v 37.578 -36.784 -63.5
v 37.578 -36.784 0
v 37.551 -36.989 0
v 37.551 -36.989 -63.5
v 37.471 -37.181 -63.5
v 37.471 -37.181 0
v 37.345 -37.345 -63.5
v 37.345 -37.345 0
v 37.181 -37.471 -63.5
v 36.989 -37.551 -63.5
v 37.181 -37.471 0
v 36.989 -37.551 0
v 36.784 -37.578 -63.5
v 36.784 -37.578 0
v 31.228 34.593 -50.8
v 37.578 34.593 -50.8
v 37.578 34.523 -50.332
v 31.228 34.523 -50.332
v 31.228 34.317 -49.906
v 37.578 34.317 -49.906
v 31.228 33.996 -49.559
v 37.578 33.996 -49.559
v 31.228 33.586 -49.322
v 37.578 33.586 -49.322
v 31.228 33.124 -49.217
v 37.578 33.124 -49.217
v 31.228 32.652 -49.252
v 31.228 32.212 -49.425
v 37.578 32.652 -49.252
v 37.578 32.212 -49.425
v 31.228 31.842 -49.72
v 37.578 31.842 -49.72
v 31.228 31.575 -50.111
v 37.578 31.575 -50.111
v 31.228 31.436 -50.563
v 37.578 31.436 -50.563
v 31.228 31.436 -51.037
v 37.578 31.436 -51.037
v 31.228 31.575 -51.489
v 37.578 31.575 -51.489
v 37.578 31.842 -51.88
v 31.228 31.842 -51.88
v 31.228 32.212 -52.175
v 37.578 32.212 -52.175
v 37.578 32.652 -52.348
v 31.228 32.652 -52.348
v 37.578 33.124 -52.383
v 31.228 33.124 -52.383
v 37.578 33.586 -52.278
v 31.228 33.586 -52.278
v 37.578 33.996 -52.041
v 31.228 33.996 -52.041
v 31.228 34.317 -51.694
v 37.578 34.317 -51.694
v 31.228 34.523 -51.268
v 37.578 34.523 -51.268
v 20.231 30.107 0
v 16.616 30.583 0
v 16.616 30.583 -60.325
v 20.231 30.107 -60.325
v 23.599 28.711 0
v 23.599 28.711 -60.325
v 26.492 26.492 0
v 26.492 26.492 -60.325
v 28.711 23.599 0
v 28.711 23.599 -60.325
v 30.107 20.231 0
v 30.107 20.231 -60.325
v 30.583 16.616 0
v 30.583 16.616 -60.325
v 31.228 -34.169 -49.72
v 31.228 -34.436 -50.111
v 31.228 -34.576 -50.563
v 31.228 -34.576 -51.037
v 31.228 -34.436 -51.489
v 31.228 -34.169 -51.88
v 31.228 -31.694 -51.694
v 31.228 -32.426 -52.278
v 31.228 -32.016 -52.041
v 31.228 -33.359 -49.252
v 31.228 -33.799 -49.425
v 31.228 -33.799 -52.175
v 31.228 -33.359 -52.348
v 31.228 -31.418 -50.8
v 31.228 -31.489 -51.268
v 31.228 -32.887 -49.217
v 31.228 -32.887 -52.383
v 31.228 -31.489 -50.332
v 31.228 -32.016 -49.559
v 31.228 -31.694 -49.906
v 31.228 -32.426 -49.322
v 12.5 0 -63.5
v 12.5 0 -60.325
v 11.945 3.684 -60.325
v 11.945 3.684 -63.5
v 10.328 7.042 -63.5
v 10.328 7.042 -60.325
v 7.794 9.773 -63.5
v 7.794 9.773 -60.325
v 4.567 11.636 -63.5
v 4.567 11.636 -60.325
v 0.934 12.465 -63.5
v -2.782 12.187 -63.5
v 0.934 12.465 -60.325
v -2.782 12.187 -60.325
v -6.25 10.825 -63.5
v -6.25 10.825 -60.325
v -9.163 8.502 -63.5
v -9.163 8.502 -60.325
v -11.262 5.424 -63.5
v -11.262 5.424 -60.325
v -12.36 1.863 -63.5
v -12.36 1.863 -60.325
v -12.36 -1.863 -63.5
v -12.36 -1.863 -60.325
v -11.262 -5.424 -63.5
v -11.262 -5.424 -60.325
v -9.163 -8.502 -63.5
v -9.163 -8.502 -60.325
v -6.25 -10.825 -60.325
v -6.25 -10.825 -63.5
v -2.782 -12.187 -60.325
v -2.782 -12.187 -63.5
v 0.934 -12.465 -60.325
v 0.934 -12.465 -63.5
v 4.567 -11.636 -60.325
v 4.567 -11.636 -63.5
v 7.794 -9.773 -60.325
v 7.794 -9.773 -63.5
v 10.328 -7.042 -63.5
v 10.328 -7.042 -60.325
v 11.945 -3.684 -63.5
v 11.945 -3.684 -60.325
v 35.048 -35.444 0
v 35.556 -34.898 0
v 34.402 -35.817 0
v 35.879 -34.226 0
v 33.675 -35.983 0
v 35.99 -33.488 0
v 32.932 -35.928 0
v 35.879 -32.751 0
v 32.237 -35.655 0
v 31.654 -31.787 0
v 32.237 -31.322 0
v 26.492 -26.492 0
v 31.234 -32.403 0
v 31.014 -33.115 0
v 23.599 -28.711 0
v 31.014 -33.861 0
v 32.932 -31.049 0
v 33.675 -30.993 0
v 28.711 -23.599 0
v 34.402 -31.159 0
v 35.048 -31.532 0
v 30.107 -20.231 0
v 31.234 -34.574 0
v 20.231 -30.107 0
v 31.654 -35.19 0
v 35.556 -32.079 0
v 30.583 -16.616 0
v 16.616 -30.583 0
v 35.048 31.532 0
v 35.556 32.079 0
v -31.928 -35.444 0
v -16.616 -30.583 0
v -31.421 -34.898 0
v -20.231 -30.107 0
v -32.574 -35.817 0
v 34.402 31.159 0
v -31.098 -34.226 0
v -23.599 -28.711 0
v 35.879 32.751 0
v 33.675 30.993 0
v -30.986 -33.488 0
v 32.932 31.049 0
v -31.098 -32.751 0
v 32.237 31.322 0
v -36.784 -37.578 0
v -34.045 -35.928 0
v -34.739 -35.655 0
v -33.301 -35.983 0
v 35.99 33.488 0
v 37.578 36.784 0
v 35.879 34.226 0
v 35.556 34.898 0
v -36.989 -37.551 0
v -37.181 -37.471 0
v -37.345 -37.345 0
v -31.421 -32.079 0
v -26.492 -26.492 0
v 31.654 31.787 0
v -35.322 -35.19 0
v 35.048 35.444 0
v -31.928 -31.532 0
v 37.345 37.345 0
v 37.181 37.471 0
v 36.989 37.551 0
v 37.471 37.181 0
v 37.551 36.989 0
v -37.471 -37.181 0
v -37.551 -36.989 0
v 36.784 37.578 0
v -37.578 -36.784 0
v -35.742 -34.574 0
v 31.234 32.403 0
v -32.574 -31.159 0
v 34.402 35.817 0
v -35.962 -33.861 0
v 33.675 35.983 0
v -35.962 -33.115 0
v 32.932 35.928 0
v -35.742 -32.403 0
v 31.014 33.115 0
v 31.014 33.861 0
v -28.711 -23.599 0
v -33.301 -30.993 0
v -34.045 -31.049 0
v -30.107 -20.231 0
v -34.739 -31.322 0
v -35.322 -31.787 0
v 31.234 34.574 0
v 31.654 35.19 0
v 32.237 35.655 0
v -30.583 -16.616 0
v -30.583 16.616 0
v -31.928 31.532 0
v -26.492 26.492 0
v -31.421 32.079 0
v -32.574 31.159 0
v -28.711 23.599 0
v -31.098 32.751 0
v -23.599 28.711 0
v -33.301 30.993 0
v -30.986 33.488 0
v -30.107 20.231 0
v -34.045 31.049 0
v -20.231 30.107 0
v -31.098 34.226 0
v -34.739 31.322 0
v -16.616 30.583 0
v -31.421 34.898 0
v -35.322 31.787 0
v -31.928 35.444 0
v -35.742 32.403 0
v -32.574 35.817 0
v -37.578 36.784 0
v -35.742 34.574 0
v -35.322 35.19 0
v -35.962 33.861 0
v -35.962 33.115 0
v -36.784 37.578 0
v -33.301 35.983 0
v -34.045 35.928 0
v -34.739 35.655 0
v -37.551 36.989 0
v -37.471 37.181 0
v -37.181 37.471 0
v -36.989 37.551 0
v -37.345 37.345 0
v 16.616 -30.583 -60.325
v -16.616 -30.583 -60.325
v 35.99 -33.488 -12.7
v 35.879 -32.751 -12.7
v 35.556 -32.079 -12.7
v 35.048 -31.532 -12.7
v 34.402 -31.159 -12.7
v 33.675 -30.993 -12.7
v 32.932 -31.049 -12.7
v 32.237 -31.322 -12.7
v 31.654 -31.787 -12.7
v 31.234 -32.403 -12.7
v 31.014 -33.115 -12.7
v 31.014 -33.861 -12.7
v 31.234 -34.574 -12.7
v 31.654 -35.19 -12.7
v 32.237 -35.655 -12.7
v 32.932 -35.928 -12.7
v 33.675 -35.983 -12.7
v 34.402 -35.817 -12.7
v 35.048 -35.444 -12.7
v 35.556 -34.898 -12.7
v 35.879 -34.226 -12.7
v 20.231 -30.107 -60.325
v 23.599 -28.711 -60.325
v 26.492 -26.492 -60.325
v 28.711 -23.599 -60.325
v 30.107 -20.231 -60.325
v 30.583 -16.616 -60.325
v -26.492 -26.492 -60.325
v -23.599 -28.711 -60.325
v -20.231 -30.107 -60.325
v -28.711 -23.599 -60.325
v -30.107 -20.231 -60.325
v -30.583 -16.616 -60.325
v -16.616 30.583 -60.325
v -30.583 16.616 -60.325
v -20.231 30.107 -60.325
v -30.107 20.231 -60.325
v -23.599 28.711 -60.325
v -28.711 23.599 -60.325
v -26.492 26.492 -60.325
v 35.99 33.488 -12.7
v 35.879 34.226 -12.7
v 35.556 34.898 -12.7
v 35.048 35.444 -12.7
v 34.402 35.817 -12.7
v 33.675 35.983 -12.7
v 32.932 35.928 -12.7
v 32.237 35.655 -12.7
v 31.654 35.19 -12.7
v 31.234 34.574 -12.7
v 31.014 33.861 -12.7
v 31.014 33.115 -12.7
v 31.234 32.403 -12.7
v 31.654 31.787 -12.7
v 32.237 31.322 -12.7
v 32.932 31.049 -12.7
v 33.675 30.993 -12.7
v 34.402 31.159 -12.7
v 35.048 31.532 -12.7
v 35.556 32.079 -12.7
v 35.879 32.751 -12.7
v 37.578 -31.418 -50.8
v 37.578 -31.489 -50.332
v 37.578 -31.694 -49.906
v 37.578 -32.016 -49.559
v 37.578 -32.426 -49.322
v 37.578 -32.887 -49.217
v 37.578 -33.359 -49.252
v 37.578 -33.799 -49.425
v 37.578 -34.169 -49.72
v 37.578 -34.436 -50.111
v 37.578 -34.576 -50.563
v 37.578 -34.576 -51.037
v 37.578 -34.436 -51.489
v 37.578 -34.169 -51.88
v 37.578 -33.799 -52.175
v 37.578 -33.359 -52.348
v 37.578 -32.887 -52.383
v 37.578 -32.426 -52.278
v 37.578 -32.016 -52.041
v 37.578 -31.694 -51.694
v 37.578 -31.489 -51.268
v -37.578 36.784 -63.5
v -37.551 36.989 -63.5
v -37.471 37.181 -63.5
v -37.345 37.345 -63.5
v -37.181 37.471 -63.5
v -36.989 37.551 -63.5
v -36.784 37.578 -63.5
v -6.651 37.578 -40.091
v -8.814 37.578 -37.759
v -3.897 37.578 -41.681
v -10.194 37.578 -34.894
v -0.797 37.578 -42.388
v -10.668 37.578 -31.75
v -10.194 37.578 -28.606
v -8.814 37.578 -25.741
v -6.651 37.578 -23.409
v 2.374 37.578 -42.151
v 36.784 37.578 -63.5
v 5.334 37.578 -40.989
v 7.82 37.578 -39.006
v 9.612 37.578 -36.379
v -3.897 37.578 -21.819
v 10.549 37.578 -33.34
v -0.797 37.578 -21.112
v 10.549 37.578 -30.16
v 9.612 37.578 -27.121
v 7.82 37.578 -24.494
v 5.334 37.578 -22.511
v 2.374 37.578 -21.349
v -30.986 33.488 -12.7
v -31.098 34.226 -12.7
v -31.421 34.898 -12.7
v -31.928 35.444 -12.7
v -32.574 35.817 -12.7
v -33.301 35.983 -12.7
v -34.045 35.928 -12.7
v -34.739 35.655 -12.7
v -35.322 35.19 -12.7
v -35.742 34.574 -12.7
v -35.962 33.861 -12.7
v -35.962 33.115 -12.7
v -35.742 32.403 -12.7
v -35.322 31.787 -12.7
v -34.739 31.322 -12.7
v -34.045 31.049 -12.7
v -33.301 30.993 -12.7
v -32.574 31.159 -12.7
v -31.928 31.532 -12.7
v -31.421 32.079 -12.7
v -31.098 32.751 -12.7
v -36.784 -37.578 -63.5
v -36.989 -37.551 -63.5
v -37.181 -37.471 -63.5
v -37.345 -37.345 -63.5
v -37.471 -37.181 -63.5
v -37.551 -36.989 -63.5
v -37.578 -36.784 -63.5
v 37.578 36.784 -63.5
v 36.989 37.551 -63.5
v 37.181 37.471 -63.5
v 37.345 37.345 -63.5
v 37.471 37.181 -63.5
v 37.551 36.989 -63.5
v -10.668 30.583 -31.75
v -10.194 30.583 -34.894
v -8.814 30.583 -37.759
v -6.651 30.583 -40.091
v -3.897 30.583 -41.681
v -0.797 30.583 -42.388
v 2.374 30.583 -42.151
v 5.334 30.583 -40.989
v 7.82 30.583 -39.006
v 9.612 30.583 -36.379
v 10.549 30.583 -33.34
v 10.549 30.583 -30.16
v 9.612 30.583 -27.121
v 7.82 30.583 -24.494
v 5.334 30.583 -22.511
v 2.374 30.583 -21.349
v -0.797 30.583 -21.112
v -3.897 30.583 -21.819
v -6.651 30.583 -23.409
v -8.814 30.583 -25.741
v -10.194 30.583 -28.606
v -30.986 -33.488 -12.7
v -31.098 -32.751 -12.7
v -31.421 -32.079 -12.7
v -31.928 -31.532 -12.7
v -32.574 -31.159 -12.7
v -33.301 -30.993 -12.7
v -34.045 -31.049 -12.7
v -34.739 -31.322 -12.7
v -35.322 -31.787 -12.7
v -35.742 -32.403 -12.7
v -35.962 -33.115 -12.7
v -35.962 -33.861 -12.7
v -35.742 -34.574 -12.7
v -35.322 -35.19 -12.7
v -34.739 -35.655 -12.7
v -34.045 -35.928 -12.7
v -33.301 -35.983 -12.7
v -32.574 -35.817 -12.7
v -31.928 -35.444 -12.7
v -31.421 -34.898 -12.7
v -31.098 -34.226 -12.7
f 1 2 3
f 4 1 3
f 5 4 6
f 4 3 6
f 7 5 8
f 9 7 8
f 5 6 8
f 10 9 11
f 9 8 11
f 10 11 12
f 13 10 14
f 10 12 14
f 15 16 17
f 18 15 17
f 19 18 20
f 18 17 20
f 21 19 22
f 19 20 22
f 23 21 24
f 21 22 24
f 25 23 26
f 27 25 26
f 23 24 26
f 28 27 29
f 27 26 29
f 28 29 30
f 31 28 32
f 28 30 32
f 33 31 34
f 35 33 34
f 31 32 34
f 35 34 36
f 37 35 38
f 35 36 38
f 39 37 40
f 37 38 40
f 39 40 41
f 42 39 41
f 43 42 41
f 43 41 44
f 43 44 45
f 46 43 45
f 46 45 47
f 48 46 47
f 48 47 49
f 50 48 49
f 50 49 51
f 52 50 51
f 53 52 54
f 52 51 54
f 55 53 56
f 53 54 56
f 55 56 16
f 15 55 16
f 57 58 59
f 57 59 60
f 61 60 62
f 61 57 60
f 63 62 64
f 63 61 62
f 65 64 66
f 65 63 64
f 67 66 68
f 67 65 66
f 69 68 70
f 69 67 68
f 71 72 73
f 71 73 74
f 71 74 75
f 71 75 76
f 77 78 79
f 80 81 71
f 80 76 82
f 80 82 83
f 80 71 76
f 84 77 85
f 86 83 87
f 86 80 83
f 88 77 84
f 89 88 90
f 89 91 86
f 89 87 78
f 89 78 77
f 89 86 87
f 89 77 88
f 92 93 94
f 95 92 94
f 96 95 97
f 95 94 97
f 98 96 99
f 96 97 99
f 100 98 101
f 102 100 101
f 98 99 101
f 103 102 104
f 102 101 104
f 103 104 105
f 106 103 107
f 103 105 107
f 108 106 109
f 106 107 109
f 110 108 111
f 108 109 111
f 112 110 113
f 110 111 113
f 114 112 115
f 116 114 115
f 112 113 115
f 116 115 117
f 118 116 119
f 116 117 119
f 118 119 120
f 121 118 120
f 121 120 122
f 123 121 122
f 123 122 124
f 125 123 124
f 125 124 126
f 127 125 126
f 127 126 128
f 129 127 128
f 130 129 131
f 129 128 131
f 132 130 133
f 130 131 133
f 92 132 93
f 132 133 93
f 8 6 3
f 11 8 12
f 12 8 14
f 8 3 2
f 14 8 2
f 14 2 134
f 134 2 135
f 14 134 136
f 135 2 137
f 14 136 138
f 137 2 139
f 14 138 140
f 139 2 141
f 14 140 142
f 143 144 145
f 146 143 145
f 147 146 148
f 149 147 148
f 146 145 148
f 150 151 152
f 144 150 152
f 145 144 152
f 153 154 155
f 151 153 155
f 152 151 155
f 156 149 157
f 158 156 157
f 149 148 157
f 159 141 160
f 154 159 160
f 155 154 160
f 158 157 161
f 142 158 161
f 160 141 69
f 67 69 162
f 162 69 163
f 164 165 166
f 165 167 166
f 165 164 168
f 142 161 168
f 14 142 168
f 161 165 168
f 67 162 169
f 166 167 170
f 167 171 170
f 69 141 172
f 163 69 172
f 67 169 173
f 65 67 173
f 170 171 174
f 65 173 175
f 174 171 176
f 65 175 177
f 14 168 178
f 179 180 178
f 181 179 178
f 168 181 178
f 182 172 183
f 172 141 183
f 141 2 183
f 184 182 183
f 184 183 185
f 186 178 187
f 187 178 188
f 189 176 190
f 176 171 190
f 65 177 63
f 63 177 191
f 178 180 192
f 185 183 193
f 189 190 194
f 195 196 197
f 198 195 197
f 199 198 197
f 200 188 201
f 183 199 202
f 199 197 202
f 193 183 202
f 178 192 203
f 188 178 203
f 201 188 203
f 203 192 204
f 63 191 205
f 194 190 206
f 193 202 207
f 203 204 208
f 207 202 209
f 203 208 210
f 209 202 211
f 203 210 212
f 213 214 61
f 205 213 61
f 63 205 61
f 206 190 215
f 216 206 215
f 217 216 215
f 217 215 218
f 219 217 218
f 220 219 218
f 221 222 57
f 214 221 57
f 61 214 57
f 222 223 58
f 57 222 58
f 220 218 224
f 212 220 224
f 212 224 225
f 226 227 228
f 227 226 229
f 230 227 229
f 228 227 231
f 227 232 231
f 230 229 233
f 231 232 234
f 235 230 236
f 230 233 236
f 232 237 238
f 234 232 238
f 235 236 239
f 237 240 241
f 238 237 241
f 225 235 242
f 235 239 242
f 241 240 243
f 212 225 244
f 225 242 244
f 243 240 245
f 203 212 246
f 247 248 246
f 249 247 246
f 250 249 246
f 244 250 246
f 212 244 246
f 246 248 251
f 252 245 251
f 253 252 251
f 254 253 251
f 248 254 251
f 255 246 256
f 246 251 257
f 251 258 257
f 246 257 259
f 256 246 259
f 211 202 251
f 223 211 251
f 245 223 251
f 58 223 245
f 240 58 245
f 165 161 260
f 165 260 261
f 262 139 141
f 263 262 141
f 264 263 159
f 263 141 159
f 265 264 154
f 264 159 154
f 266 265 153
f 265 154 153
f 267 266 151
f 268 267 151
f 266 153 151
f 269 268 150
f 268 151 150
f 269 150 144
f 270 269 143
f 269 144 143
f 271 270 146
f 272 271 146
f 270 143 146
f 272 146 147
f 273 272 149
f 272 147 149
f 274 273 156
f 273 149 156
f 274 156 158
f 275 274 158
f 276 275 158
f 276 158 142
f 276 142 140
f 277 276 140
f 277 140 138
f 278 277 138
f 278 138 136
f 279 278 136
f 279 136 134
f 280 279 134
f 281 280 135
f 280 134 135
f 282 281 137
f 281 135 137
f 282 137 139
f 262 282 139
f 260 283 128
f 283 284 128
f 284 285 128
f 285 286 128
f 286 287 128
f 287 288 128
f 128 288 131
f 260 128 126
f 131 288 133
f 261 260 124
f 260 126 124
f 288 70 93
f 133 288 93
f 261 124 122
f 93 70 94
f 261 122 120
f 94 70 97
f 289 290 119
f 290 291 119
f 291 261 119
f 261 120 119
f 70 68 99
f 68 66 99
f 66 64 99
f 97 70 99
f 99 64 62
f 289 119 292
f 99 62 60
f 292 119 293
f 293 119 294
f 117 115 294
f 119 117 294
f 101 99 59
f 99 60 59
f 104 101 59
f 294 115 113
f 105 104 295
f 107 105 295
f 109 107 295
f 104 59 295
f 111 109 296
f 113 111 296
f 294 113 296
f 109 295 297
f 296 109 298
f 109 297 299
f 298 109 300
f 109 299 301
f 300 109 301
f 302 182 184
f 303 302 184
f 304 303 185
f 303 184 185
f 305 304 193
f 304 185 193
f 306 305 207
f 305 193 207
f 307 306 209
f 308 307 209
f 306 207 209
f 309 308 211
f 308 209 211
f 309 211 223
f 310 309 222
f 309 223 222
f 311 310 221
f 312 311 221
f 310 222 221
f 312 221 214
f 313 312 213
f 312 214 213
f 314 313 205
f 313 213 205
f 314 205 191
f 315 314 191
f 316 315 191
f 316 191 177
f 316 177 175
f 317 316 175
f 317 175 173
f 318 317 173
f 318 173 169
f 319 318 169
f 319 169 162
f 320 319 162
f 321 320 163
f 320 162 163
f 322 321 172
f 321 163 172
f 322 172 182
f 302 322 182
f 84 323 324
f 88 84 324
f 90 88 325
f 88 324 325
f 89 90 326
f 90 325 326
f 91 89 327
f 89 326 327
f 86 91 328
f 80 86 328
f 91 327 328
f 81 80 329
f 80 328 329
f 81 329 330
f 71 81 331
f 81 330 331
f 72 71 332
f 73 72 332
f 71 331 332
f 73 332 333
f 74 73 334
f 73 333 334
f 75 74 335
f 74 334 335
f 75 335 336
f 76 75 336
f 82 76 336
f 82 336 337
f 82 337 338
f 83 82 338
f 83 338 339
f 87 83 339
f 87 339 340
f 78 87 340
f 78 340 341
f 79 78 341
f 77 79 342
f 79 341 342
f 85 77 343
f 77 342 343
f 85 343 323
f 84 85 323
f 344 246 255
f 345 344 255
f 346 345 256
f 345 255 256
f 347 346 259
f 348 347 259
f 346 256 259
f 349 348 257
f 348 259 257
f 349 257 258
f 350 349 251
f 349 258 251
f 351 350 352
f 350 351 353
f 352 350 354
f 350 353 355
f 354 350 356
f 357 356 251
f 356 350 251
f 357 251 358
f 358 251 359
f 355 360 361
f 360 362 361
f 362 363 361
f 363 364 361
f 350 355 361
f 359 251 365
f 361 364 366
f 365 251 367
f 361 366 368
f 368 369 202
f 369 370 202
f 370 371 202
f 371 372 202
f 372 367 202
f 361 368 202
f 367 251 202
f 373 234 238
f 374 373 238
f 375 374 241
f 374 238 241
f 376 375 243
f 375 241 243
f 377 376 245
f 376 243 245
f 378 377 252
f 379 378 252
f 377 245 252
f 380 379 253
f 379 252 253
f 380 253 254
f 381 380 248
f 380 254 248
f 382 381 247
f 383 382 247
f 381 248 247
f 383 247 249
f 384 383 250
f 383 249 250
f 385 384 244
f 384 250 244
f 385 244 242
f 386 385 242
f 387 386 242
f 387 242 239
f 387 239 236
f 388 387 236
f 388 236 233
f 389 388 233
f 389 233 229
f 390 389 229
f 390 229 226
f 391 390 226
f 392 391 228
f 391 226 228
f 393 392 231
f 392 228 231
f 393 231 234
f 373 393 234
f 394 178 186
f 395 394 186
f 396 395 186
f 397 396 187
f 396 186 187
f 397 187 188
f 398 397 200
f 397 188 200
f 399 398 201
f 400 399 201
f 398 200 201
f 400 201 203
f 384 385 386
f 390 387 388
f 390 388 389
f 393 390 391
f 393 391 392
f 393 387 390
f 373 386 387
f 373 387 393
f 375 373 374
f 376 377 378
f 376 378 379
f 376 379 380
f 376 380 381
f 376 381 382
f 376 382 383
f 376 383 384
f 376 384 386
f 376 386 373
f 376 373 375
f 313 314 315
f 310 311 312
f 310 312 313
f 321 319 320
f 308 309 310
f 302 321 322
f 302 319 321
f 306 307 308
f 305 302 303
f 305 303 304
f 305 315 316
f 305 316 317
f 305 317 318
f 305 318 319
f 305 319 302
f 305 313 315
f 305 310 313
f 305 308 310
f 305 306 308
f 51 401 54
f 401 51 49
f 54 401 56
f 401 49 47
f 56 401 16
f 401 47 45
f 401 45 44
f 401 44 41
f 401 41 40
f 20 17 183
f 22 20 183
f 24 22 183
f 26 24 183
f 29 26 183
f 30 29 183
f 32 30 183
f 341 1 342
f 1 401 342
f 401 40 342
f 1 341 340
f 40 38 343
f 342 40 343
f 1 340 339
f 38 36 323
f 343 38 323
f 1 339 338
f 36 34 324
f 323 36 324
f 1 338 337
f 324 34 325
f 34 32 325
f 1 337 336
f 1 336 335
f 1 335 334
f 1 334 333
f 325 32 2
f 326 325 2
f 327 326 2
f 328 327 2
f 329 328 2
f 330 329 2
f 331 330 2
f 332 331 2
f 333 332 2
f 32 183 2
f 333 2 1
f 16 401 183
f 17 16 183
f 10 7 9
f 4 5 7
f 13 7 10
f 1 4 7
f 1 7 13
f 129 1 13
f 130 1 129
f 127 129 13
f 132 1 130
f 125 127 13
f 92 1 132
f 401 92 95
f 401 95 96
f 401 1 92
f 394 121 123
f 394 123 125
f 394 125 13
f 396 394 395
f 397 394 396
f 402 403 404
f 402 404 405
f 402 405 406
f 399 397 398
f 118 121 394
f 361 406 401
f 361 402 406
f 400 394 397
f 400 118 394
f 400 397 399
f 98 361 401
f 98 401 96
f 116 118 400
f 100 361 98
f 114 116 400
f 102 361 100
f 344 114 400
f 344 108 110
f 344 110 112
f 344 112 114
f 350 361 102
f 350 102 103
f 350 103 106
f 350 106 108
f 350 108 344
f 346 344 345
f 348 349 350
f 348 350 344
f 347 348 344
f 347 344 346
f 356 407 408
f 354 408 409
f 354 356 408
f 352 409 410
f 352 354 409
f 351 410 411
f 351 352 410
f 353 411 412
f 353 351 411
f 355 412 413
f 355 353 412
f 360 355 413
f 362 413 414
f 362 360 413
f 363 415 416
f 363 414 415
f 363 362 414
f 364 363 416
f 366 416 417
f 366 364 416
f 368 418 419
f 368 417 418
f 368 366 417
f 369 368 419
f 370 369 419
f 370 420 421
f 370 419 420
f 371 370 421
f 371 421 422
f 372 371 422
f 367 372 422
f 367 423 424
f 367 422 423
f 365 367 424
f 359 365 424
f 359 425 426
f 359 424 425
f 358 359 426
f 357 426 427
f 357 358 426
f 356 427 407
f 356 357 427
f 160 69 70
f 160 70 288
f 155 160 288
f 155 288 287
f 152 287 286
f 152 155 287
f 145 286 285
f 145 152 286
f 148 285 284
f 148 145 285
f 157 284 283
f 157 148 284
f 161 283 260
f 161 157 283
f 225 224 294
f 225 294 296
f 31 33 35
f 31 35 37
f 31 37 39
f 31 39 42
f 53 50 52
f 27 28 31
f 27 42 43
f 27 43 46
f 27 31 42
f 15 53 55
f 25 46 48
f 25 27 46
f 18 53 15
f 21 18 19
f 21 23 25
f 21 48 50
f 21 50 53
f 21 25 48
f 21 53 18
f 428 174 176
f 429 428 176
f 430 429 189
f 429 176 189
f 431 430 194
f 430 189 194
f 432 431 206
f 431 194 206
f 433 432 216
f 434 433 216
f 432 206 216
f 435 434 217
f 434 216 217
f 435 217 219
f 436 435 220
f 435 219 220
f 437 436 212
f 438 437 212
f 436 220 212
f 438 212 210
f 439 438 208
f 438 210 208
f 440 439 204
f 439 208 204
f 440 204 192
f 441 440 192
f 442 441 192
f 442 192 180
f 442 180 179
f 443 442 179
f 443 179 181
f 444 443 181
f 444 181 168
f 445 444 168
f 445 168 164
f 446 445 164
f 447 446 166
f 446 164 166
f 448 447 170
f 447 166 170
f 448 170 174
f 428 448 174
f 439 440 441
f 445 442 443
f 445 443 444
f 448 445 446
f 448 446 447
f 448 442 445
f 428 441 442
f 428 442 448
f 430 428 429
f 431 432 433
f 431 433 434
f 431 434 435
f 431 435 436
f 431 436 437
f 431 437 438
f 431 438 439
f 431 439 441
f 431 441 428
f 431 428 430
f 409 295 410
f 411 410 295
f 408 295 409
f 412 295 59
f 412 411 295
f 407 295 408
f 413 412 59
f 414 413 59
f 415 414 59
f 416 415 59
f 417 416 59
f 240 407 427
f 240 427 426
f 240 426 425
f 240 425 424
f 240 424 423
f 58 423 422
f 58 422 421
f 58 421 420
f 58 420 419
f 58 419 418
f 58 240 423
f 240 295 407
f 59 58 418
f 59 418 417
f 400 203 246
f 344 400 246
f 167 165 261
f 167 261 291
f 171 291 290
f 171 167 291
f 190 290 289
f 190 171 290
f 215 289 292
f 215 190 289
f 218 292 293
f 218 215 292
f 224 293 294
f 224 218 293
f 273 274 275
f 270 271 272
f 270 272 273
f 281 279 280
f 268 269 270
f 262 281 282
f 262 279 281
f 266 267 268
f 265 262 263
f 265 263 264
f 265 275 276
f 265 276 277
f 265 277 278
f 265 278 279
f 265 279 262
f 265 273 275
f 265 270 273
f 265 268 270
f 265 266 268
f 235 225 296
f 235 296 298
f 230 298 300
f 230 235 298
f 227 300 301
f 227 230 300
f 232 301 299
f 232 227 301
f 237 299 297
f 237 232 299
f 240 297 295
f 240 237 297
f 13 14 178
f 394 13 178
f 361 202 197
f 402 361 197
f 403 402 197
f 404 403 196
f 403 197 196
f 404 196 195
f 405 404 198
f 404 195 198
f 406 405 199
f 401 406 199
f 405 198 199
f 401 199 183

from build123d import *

# Parameters (mm, degrees)
BOSS_EXTRUDE1_DEPTH = 63.5
SKETCH10_R          = 2.5019
CUT_EXTRUDE3_DEPTH  = 12.7
BOSS_EXTRUDE2_START = -60.325
SKETCH12_R          = 12.5
BOSS_EXTRUDE2_DEPTH = 3.175
SKETCH14_R          = 1.5875
CUT_EXTRUDE4_DEPTH  = 6.35
CUT_EXTRUDE5_REACH  = 107.322
SKETCH15_R          = 10.668


with BuildPart() as part:
    # Sketch1 → Boss-Extrude1 (new body)
    with BuildSketch(Plane.XY):
        with BuildLine():
            Line((37.577733998, 36.783983953), (37.577733998, -36.783983998))
            ThreePointArc((37.577733998, -36.783983998), (37.345250005, -37.345250005), (36.783983998, -37.577733998))
            Line((36.783983998, -37.577733998), (-36.783983953, -37.577733998))
            ThreePointArc((-36.783983953, -37.577733998), (-37.34524996, -37.345250005), (-37.577733953, -36.783983998))
            Line((-37.577733953, -36.783983998), (-37.577733953, 36.783983953))
            ThreePointArc((-37.577733953, 36.783983953), (-37.34524996, 37.34524996), (-36.783983953, 37.577733953))
            Line((-36.783983953, 37.577733953), (36.783983998, 37.577733953))
            ThreePointArc((36.783983998, 37.577733953), (37.345250005, 37.34524996), (37.577733998, 36.783983953))
        make_face()
        with BuildLine():
            Line((-16.61571496, 30.582545515), (16.61571496, 30.582545515))
            ThreePointArc((16.61571496, 30.582545515), (26.491755557, 26.491755557), (30.582545515, 16.61571496))
            Line((30.582545515, 16.61571496), (30.582545515, -16.61571496))
            ThreePointArc((30.582545515, -16.61571496), (26.491755557, -26.491755557), (16.61571496, -30.582545515))
            Line((16.61571496, -30.582545515), (-16.61571496, -30.582545515))
            ThreePointArc((-16.61571496, -30.582545515), (-26.491755557, -26.491755557), (-30.582545515, -16.61571496))
            Line((-30.582545515, -16.61571496), (-30.582545515, 16.61571496))
            ThreePointArc((-30.582545515, 16.61571496), (-26.491755557, 26.491755557), (-16.61571496, 30.582545515))
        make_face(mode=Mode.SUBTRACT)
    extrude(amount=-BOSS_EXTRUDE1_DEPTH)

    # Sketch10 → Cut-Extrude3 (cut)
    with BuildSketch(Plane.XY):
        with Locations((33.488333998, 33.488333998)):
            Circle(SKETCH10_R)
        with Locations((33.488333998, -33.488333998)):
            Circle(SKETCH10_R)
        with Locations((-33.488333998, -33.488333998)):
            Circle(SKETCH10_R)
        with Locations((-33.488333998, 33.488333998)):
            Circle(SKETCH10_R)
    extrude(amount=-CUT_EXTRUDE3_DEPTH, mode=Mode.SUBTRACT)

    # Sketch12 → Boss-Extrude2 (add)
    with BuildSketch(Plane.XY.offset(BOSS_EXTRUDE2_START)):
        with BuildLine():
            Line((37.577733998, 36.783983953), (37.577733998, -36.783983998))
            ThreePointArc((37.577733998, -36.783983998), (37.345250005, -37.345250005), (36.783983998, -37.577733998))
            Line((36.783983998, -37.577733998), (-36.783983953, -37.577733998))
            ThreePointArc((-36.783983953, -37.577733998), (-37.34524996, -37.345250005), (-37.577733953, -36.783983998))
            Line((-37.577733953, -36.783983998), (-37.577733953, 36.783983953))
            ThreePointArc((-37.577733953, 36.783983953), (-37.34524996, 37.34524996), (-36.783983953, 37.577733953))
            Line((-36.783983953, 37.577733953), (36.783983998, 37.577733953))
            ThreePointArc((36.783983998, 37.577733953), (37.345250005, 37.34524996), (37.577733998, 36.783983953))
        make_face()
        Circle(SKETCH12_R, mode=Mode.SUBTRACT)
    extrude(amount=-BOSS_EXTRUDE2_DEPTH)

    # Sketch14 → Cut-Extrude4 (cut)
    with BuildSketch(Plane(origin=(37.577733998, 0, 0), x_dir=(0, 0, -1), z_dir=(1, 0, 0))):
        with Locations(Location((50.8, 33.005733953, 0), (0, 0, 90))):
            Circle(SKETCH14_R)
        with Locations(Location((50.8, -33.005733998, 0), (0, 0, 90))):
            Circle(SKETCH14_R)
    extrude(amount=-CUT_EXTRUDE4_DEPTH, mode=Mode.SUBTRACT)

    # Sketch15 → Cut-Extrude5 (cut, up to next)
    with BuildSketch(Plane.XZ.offset(-37.577733953), mode=Mode.PRIVATE) as cut_extrude5_sk1:
        with Locations(Location((0, -31.75, 0), (0, 0, 180))):
            Circle(SKETCH15_R)
    cut_extrude5_tool1 = extrude(cut_extrude5_sk1.sketch, amount=CUT_EXTRUDE5_REACH, mode=Mode.PRIVATE) & part.part
    add(cut_extrude5_tool1.solids().sort_by_distance((0, 37.577734, -31.75))[0], mode=Mode.SUBTRACT)


solid = part.part
